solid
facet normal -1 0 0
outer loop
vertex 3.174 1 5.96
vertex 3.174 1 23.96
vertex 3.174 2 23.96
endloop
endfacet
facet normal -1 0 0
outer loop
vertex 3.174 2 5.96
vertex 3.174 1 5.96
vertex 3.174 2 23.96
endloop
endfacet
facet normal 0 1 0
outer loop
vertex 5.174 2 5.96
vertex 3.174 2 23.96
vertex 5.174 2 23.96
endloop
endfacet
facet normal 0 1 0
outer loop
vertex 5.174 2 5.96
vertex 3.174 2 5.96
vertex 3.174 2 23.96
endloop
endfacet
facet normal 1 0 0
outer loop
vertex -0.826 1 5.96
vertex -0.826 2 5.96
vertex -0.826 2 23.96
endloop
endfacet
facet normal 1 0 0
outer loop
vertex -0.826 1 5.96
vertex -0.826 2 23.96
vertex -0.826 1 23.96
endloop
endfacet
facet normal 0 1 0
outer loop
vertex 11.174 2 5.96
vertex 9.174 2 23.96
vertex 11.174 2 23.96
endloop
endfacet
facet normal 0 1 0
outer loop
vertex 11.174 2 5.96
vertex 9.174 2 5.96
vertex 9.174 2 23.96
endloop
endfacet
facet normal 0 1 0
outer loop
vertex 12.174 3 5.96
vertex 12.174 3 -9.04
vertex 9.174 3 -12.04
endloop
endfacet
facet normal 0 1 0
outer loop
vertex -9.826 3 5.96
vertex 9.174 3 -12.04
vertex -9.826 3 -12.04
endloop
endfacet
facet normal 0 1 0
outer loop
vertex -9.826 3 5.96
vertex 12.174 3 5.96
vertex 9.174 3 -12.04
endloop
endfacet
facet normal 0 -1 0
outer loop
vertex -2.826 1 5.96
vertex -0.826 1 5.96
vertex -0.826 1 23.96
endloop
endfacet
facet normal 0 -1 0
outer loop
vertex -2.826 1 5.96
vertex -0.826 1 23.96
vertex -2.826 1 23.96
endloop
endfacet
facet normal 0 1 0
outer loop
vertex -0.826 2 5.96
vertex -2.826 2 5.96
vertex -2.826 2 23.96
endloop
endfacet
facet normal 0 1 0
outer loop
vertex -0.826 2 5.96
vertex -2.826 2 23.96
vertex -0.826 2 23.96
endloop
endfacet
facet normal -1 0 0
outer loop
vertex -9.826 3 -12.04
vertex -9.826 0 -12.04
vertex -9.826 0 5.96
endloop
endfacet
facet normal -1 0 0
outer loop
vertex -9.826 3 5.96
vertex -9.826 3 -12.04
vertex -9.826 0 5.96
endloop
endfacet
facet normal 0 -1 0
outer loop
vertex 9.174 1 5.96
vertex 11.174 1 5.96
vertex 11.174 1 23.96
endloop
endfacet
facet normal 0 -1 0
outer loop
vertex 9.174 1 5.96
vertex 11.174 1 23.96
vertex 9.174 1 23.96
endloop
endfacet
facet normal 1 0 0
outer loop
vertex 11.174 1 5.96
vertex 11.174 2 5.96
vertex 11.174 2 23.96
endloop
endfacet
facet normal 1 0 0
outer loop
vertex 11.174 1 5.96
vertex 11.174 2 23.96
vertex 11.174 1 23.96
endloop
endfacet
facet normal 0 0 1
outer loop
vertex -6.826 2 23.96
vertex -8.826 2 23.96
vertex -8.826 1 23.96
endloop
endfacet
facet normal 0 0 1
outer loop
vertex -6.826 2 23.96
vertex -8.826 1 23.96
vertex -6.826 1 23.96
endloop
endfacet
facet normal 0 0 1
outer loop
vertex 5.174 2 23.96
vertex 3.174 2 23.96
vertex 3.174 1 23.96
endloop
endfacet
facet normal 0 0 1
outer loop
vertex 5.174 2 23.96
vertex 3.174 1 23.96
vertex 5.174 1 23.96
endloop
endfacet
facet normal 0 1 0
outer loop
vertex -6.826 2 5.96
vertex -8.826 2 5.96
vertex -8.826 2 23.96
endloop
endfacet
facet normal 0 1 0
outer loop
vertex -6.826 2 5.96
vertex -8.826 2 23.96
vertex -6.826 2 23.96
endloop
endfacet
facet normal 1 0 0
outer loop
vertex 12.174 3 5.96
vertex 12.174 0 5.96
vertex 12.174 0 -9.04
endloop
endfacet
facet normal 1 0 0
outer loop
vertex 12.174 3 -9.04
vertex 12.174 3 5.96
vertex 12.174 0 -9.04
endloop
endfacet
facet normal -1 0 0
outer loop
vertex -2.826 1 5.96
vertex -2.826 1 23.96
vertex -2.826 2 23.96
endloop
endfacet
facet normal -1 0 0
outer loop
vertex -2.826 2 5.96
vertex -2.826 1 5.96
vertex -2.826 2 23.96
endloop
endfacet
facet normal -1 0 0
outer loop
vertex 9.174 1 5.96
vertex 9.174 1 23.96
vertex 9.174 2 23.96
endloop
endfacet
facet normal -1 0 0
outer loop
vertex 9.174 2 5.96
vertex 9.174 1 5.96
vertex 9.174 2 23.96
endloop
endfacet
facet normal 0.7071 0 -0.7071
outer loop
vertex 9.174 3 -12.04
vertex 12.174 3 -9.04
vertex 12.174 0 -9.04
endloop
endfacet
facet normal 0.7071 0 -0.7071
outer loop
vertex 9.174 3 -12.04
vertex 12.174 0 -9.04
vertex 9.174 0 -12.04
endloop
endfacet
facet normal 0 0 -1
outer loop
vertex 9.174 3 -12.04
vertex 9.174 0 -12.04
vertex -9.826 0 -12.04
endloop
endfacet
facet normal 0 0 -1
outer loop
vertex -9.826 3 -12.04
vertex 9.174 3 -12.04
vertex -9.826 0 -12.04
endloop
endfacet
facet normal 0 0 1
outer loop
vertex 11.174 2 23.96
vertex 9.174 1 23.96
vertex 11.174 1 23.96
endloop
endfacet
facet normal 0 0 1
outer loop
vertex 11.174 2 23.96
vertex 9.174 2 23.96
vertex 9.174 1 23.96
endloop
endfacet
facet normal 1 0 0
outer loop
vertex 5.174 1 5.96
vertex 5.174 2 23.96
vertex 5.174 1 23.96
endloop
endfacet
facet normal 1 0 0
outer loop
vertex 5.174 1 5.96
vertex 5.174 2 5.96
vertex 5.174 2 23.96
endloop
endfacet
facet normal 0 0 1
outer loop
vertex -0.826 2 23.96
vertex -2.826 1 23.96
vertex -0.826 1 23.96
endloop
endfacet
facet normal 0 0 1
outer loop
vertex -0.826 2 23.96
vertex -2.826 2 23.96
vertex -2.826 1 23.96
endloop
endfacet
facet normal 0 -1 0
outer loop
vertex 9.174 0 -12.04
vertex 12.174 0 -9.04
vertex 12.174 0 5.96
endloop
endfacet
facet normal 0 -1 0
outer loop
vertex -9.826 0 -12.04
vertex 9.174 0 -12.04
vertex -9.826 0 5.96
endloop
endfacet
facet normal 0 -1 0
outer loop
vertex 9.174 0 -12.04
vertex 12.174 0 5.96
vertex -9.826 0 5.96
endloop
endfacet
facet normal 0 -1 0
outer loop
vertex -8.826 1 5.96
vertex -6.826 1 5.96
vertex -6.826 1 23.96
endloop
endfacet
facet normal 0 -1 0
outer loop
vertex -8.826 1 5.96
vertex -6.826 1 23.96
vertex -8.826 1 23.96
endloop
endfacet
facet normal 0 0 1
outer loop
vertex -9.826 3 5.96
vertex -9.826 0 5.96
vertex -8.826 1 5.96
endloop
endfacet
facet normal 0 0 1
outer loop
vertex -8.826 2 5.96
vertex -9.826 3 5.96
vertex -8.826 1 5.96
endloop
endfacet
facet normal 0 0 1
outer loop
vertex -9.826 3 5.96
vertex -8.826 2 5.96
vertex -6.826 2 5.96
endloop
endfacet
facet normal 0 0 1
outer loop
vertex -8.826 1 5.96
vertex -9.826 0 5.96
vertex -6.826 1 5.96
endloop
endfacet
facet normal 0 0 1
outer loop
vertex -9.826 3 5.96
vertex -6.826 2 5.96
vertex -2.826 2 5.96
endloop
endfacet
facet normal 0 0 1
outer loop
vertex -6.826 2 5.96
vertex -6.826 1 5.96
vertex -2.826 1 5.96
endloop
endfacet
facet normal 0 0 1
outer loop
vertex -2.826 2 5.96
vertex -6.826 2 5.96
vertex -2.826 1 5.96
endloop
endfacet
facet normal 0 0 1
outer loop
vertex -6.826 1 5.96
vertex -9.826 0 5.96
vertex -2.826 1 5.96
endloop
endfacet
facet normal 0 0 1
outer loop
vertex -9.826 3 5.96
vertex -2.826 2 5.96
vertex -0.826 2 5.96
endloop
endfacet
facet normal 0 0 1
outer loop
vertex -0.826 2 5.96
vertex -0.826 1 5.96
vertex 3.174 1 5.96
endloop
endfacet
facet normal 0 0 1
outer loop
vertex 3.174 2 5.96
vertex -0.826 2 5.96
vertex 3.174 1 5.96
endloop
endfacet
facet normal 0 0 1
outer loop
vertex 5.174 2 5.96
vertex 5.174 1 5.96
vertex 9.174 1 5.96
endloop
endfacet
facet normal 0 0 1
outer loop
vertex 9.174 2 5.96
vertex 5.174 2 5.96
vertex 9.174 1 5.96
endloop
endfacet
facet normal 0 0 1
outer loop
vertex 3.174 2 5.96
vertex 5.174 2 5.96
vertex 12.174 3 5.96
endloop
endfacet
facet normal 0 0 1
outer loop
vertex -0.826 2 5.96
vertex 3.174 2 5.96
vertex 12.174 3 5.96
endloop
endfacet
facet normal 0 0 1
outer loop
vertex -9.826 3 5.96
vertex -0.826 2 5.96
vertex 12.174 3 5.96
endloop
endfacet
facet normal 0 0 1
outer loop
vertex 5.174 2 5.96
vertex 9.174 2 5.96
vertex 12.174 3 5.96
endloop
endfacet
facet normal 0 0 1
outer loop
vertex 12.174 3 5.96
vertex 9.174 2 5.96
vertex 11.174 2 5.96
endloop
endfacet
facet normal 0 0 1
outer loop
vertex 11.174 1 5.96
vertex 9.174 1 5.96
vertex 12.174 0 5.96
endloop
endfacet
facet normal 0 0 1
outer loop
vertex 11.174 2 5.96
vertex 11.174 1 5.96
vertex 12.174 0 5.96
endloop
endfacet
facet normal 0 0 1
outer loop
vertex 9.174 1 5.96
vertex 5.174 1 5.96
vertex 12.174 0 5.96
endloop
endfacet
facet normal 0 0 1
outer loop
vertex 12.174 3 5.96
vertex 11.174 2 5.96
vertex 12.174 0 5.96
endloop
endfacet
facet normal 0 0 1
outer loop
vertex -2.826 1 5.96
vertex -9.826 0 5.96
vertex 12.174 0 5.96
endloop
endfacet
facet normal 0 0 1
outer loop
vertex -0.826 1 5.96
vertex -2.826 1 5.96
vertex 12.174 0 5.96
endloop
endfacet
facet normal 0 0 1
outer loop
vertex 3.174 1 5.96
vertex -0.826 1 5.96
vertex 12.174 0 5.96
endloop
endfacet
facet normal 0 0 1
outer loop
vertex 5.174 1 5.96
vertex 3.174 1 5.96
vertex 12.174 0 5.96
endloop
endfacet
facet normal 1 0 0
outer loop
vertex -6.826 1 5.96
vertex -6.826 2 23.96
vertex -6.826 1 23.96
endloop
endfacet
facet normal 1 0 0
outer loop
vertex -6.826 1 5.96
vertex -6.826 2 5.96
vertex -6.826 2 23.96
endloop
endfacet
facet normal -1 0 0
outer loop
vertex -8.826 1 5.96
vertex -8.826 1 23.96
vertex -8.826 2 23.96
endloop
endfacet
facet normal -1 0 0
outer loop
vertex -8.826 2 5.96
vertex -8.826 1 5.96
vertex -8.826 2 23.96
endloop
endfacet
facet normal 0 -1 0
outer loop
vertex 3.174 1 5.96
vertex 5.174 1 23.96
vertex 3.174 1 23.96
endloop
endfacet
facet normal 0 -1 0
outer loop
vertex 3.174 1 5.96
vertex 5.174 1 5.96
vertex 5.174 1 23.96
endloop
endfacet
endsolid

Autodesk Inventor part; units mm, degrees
ref_plane "YZ Plane" through (0, 0, 0) normal (1, 0, 0) x (0, 1, 0)
ref_plane "XZ Plane" through (0, 0, 0) normal (0, 1, 0) x (-1, 0, 0)
ref_plane "XY Plane" through (0, 0, 0) normal (0, 0, 1) x (1, 0, 0)
sketch "Sketch1" plane through (0, 0, 0) normal (0, 1, 0) x (-1, 0, 0)
  line L0 (9.8262, 5.9604) -> (-12.1738, 5.9604)
  line L1 (-12.1738, 5.9604) -> (-12.1738, -12.0396)
  line L2 (-12.1738, -12.0396) -> (9.8262, -12.0396)
  line L3 (9.8262, -12.0396) -> (9.8262, 5.9604)
  point P0 (0, 0)
  dimension "d0" = 22
  dimension "d1" = 18
extrude "Extrusion1" add sketch "Sketch1" along normal blind 3
sketch "Sketch2" plane through (-9.8262, 0, 5.9604) normal (0, 0, 1) x (1, 0, 0)
  line L0 (1, 2) -> (3, 2)
  line L1 (3, 2) -> (3, 1)
  line L2 (3, 1) -> (1, 1)
  line L3 (1, 1) -> (1, 2)
  line L4 (0, 3) -> (22, 3) projected
  line L5 (0, 0) -> (0, 3) projected
  line L6 (7, 2) -> (9, 2)
  line L7 (9, 2) -> (9, 1)
  line L8 (9, 1) -> (7, 1)
  line L9 (7, 1) -> (7, 2)
  line L10 (13, 2) -> (15, 2)
  line L11 (15, 2) -> (15, 1)
  line L12 (15, 1) -> (13, 1)
  line L13 (13, 1) -> (13, 2)
  line L14 (19, 2) -> (21, 2)
  line L15 (21, 2) -> (21, 1)
  line L16 (21, 1) -> (19, 1)
  line L17 (19, 1) -> (19, 2)
  line L18 (22, 0) -> (22, 3) projected
  point P0 (9.8262, 0)
  point P1 (1, 1.5)
  point P2 (7, 1.5)
  point P3 (13, 1.5)
  point P4 (19, 1.5)
  point P5 (8, 2)
  dimension "d4" = 1
  dimension "d5" = 1
  dimension "d6" = 2
  dimension "d7" = 1
  dimension "d8" = 1
  dimension "d9" = 2
  dimension "d10" = 1
  dimension "d11" = 2
  dimension "d12" = 1
  dimension "d13" = 2
  dimension "d14" = 1
  dimension "d15" = 1
  dimension "d16" = 1
  dimension "d17" = 1
  dimension "d18" = 4
  dimension "d19" = 4
extrude "Extrusion2" add sketch "Sketch2" along normal blind 18
sketch "Sketch3" plane through (0, 3, 0) normal (0, 1, 0) x (1, 0, 0)
  line L0 (12.1738, 12.0396) -> (9.1738, 12.0396)
  line L1 (12.1738, 12.0396) -> (-9.8262, 12.0396) projected
  line L2 (12.1738, 12.0396) -> (12.1738, 9.0396)
  line L3 (12.1738, 9.0396) -> (9.1738, 12.0396)
  point P0 (0, 0)
  dimension "d22" = 3
  dimension "d23" = 3
extrude "Extrusion3" cut sketch "Sketch3" against normal blind 18
properties part number "Rectifier"
